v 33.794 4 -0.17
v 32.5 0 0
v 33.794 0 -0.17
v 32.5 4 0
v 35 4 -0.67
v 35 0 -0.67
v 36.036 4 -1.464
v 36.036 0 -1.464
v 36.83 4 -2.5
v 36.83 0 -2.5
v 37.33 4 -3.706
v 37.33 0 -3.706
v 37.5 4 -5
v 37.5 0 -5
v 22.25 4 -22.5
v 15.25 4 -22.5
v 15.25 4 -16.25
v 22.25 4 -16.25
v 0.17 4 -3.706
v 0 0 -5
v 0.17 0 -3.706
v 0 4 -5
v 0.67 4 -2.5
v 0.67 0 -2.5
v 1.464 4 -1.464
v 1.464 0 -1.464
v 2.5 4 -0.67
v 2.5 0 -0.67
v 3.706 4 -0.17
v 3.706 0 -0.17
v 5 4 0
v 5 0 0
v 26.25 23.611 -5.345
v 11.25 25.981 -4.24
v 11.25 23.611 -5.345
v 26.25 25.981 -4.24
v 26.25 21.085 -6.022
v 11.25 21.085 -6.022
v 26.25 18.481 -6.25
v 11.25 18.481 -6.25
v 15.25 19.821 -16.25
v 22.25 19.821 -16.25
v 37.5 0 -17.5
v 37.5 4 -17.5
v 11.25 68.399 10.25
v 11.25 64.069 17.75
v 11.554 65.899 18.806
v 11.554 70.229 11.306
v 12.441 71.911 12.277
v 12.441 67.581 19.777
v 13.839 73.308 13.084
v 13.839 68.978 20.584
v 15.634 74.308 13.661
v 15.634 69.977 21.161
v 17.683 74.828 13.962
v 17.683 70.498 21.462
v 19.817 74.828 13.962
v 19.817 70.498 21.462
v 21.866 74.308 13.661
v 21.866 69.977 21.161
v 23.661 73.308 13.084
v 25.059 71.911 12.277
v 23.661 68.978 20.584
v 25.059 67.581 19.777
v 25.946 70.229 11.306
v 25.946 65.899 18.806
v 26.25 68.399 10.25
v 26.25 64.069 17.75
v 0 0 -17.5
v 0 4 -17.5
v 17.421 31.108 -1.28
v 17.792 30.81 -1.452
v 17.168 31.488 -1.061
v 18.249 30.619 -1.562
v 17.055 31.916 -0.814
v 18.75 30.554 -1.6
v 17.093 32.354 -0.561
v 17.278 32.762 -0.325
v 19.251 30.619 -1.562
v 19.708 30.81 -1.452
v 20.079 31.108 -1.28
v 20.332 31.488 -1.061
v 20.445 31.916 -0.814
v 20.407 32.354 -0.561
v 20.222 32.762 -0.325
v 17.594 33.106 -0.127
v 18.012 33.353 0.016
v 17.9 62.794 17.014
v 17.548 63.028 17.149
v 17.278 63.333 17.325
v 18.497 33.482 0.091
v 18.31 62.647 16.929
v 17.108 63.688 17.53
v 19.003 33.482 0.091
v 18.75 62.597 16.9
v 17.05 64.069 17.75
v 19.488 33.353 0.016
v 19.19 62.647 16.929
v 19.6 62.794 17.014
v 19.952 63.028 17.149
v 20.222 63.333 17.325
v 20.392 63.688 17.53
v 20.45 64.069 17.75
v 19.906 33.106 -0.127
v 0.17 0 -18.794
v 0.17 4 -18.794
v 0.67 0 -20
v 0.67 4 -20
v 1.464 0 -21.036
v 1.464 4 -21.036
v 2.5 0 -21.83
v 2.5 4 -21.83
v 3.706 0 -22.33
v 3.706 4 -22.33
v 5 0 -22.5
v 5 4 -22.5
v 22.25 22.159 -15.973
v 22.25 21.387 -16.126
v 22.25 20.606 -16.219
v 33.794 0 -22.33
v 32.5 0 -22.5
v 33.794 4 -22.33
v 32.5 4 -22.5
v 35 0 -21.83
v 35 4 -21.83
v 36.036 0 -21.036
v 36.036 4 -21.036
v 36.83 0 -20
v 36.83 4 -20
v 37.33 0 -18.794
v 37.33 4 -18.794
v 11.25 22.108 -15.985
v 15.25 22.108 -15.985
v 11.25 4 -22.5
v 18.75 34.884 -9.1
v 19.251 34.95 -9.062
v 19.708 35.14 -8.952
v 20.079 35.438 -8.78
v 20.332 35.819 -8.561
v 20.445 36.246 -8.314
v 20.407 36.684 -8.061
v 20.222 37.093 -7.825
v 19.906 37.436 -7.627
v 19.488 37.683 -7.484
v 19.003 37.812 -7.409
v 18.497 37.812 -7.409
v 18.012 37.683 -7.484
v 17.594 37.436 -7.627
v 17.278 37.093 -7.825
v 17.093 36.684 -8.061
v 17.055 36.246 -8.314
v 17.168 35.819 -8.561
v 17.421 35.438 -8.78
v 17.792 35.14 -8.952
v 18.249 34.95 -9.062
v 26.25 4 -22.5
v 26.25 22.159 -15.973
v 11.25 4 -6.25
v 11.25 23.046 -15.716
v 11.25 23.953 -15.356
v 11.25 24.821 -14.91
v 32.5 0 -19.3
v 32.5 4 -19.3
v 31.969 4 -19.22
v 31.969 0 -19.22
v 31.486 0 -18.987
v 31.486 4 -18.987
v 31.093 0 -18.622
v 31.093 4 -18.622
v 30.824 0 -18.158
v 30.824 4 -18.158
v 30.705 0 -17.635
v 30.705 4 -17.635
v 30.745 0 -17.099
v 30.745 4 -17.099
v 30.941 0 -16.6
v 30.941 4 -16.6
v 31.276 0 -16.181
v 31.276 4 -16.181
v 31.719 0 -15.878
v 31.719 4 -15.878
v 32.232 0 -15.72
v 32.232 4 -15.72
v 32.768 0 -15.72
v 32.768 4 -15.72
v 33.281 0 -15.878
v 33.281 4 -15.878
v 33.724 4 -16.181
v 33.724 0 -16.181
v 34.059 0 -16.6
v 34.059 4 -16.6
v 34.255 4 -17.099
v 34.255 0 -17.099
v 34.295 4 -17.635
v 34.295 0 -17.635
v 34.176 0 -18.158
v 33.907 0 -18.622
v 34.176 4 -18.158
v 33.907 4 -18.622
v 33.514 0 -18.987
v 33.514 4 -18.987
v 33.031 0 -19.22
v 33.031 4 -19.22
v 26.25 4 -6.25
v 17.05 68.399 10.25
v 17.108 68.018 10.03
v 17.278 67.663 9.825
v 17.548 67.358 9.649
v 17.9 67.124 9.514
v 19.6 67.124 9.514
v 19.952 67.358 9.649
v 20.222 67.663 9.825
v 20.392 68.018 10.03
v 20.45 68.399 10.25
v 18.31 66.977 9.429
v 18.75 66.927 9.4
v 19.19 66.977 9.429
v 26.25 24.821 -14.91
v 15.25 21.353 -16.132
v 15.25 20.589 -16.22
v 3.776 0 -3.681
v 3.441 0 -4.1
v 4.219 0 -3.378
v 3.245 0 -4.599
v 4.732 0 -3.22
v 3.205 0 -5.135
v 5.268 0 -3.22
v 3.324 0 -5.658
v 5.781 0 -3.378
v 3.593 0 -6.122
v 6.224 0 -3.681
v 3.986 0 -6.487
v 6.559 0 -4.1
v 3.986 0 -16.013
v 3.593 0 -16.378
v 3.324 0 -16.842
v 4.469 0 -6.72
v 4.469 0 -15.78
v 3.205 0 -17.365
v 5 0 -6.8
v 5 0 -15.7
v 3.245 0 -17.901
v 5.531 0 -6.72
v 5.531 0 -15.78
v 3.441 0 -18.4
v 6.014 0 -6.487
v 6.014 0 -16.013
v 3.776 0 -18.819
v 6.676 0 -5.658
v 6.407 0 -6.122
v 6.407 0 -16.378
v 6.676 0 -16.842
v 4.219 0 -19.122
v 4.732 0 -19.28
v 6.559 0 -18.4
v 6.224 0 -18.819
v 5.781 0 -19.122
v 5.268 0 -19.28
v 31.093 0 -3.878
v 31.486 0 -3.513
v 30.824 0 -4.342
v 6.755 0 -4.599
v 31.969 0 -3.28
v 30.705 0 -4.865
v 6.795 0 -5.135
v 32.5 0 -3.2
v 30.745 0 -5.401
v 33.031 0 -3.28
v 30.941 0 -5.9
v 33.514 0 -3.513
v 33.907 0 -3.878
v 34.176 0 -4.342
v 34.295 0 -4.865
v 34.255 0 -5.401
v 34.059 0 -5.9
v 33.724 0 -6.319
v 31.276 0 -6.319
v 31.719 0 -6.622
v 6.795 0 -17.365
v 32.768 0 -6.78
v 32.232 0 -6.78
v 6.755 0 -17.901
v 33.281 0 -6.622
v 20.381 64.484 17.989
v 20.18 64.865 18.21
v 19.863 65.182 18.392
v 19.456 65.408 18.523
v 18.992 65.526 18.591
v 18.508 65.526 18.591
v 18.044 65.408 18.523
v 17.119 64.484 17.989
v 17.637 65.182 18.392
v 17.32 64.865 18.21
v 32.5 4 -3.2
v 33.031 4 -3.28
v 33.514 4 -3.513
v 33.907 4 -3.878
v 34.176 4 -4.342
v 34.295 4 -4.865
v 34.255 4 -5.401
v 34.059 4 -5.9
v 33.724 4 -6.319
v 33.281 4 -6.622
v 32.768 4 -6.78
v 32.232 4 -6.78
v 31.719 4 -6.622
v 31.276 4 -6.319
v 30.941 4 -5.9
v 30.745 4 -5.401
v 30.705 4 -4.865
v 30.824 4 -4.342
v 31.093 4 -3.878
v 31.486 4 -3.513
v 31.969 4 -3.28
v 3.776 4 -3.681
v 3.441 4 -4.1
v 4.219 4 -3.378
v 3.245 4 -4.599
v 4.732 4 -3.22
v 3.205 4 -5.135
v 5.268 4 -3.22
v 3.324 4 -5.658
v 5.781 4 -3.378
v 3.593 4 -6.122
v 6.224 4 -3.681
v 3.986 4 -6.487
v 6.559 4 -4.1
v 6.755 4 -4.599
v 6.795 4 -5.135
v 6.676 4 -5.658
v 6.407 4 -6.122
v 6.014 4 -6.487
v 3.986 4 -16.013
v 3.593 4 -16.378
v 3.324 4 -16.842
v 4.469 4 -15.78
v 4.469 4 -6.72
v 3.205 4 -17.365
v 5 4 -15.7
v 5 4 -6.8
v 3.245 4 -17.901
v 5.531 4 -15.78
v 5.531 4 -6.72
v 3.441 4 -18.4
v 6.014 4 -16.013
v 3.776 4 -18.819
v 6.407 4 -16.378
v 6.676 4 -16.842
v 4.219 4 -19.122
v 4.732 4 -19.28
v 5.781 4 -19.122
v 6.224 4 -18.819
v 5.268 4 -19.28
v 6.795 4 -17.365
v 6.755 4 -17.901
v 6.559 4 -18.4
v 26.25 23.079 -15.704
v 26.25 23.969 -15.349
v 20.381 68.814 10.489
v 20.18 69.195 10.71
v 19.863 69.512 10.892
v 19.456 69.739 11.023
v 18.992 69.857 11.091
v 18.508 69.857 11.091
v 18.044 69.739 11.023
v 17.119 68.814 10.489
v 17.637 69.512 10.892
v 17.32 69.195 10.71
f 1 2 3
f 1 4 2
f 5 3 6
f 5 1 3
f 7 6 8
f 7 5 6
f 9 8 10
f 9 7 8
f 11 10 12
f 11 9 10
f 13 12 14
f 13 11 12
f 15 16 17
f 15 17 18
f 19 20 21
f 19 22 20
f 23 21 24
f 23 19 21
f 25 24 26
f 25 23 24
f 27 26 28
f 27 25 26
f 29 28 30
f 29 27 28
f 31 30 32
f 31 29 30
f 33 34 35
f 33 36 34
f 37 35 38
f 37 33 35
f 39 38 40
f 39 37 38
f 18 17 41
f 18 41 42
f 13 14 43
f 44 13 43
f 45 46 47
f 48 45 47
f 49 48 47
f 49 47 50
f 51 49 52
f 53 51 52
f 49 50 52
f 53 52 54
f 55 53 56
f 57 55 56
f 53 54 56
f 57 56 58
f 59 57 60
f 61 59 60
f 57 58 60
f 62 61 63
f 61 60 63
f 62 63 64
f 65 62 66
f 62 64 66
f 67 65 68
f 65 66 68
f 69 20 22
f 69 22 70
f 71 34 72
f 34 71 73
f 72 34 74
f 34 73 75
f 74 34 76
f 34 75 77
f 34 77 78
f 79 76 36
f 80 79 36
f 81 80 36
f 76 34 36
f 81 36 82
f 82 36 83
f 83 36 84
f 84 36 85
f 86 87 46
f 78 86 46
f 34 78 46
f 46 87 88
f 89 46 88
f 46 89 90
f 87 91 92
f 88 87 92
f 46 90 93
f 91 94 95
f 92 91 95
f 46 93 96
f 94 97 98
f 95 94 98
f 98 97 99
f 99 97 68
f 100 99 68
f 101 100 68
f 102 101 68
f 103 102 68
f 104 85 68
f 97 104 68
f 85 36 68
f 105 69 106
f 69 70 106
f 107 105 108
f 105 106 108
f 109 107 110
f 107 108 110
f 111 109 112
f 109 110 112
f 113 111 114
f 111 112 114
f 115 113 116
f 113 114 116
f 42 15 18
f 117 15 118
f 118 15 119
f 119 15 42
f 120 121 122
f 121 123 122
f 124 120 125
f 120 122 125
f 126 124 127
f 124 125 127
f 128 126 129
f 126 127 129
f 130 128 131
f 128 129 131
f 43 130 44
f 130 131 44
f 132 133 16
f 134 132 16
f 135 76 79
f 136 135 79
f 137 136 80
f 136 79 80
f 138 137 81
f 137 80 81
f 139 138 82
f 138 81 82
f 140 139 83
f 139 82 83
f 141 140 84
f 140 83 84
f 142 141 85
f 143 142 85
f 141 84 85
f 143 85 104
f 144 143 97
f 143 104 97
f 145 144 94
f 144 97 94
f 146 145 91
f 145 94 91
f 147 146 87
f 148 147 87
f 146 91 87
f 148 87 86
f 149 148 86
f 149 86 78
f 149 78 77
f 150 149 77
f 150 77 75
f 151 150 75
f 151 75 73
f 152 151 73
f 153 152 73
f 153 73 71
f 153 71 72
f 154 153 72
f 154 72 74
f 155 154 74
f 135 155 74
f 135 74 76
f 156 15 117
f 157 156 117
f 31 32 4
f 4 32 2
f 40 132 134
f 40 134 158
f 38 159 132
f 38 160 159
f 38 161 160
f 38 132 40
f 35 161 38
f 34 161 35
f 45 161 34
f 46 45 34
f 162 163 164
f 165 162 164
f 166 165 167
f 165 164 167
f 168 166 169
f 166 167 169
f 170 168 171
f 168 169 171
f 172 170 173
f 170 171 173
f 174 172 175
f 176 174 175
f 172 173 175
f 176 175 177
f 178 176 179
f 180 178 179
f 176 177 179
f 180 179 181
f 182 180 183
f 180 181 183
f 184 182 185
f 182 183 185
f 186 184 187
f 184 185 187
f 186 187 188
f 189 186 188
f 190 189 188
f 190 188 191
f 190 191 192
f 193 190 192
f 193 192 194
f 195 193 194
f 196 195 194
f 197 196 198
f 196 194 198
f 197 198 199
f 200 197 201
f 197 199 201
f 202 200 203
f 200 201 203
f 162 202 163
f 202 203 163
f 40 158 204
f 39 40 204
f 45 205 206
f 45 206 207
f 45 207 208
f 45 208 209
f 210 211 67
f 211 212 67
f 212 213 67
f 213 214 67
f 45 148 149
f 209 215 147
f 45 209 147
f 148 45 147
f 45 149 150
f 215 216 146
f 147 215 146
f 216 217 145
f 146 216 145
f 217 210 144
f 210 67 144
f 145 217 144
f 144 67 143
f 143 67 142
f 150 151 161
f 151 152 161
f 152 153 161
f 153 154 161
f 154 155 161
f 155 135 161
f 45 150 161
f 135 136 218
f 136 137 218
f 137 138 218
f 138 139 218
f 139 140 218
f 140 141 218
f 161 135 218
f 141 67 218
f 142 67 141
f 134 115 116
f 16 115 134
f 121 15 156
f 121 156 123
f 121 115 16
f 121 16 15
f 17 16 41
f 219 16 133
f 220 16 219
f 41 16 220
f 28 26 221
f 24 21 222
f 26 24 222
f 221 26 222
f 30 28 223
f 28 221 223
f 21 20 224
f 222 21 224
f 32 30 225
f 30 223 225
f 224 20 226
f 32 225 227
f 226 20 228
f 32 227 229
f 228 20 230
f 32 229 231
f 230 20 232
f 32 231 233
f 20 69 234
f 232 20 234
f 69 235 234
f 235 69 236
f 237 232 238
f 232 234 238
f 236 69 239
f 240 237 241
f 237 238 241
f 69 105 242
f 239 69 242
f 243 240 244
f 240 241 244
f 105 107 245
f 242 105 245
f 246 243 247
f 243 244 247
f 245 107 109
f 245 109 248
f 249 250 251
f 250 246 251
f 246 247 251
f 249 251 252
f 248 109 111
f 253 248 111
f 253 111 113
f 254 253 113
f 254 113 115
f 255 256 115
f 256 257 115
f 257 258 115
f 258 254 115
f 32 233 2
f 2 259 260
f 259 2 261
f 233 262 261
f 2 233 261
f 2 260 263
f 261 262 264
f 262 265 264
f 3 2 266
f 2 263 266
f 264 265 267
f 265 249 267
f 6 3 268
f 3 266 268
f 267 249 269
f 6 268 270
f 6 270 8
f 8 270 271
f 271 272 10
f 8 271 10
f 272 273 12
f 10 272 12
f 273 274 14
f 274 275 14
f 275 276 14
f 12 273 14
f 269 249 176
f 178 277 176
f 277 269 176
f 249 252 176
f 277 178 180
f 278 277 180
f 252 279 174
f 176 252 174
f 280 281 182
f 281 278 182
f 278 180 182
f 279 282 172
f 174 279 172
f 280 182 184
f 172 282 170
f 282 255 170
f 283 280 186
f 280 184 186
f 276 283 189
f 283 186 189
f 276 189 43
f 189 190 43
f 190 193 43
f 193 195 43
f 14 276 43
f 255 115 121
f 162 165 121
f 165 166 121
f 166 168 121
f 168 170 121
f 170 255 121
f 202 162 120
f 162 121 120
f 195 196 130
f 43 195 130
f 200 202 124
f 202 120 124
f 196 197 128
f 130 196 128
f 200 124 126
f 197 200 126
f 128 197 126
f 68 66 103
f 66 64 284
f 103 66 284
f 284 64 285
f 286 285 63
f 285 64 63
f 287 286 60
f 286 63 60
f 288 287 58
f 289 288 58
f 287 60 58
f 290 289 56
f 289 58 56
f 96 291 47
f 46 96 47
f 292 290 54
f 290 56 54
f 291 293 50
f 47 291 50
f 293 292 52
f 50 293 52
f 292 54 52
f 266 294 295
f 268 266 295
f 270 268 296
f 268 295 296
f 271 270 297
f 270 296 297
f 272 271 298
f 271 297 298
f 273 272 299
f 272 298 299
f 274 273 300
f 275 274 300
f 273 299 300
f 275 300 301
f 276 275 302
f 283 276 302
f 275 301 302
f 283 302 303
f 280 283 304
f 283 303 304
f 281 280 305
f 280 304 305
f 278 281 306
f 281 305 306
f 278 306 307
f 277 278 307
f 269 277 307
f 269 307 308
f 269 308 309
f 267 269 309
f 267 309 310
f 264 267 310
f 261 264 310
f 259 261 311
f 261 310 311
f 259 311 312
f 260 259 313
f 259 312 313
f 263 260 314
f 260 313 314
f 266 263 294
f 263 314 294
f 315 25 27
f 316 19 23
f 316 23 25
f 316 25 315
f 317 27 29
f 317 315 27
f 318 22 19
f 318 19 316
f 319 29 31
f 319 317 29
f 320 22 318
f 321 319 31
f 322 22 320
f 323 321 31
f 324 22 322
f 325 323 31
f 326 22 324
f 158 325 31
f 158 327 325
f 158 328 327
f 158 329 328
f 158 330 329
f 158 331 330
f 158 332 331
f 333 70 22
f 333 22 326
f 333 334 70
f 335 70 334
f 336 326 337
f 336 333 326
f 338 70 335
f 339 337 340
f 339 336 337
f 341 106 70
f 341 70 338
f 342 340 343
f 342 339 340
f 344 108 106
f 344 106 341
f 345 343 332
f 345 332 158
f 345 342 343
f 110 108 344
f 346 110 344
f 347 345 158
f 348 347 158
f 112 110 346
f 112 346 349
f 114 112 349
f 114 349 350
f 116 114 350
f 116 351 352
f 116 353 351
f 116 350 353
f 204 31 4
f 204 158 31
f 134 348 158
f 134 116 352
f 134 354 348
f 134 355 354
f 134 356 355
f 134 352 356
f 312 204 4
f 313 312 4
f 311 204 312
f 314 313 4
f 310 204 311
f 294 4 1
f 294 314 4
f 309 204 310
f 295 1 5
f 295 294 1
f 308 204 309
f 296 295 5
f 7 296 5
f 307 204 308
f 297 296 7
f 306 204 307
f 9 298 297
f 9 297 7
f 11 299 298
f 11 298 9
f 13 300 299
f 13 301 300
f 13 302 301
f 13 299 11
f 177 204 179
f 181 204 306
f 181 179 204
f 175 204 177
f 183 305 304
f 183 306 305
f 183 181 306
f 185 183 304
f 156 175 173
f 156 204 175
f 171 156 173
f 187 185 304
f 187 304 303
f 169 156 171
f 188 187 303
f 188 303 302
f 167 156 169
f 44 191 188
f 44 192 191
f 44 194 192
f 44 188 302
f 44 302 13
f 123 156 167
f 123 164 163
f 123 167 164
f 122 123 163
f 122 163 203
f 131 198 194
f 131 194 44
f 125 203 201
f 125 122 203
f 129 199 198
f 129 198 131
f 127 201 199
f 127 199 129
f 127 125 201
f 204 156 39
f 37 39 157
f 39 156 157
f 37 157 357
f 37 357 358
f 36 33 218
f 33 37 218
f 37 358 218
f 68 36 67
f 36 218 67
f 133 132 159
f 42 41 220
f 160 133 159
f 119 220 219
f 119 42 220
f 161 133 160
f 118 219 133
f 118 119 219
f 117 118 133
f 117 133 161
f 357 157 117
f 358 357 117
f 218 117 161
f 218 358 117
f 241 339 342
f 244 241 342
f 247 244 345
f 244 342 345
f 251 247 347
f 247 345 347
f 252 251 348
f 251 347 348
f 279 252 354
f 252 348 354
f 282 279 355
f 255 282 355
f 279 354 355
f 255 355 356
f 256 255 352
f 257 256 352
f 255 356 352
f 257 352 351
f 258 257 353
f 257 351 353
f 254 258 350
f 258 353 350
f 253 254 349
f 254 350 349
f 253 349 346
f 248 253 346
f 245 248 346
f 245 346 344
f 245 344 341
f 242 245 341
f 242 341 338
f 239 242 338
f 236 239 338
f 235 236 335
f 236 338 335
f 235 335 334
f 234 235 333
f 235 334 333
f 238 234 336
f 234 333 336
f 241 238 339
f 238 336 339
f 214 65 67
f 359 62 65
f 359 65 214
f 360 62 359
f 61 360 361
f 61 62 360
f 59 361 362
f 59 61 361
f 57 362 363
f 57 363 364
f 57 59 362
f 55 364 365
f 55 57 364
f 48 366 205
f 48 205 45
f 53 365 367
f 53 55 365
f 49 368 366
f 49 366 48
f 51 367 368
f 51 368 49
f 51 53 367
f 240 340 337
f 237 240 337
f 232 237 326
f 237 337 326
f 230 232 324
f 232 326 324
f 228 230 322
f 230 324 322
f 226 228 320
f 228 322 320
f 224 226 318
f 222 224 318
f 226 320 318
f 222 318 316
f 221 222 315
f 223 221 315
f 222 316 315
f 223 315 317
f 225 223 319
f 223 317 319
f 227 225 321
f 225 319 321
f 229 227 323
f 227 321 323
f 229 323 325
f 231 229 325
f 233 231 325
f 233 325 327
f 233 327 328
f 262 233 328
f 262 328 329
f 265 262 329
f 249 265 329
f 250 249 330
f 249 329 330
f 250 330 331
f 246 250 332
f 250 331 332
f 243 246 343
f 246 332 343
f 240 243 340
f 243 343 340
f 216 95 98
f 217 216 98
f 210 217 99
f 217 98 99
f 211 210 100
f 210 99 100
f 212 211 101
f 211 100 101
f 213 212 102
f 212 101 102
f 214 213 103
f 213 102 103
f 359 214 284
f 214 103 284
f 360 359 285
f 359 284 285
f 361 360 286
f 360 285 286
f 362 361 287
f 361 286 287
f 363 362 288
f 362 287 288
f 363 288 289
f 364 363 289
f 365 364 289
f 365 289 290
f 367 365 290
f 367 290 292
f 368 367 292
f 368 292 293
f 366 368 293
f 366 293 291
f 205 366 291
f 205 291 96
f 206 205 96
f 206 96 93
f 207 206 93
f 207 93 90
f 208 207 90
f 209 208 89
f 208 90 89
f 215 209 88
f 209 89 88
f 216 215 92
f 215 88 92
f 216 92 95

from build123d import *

# Parameters (mm, degrees)
SKETCH_1_W          = 37.5
SKETCH_1_H          = 22.5
EXTRUDE_2_DEPTH     = 4
SKETCH_2_W          = 15
SKETCH_2_H          = 10
EXTRUDE_3_DEPTH     = 18.5
EXTRUDE_4_DEPTH     = 15
EXTRUDE_5_DEPTH     = 8.66025404
SKETCH_5_R          = 1.7
CUT_EXTRUDE_1_DEPTH = 10
FILLET_1_R          = 15
FILLET_3_R          = 5
SKETCH_9_R          = 1.8
CUT_EXTRUDE_2_DEPTH = 4
FILLET_5_R          = 10
RIB_10_REACH        = 84.489
SKETCH_16_WALL_W    = 186.275176358
SKETCH_16_WALL_H    = 4
RIB_11_REACH        = 84.489
SKETCH_17_WALL_W    = 186.223541182
SKETCH_17_WALL_H    = 4


with BuildPart() as part:
    # 草图1 → 凸台-拉伸2 (new body)
    with BuildSketch(Plane(origin=(0, 0, 0), x_dir=(1, 0, 0), z_dir=(0, 1, 0))):
        with Locations((18.75, 11.25)):
            Rectangle(SKETCH_1_W, SKETCH_1_H)
    extrude(amount=EXTRUDE_2_DEPTH)

    # 草图2 → 凸台-拉伸3 (add)
    with BuildSketch(Plane(origin=(0, 4, 0), x_dir=(1, 0, 0), z_dir=(0, 1, 0))):
        with Locations((18.75, 11.25)):
            Rectangle(SKETCH_2_W, SKETCH_2_H)
    extrude(amount=EXTRUDE_3_DEPTH)

    # 草图3 → 凸台-拉伸4 (add)
    with BuildSketch(Plane(origin=(26.25, 0, 0), x_dir=(0, 0, -1), z_dir=(1, 0, 0))):
        Polygon((6.25, 22.5), (-17.75, 64.069219382), (-10.25, 68.399346401), (16.25, 22.5), align=None)
    extrude(amount=-EXTRUDE_4_DEPTH)

    # 草图4 → 凸台-拉伸5 (add)
    with BuildSketch(Plane(origin=(0, 8.331329387, -14.430285793), x_dir=(1, 0, 0), z_dir=(0, -0.5000000000000041, 0.8660254037844363))):
        with BuildLine():
            Line((26.25, 64.360571585), (11.25, 64.360571585))
            ThreePointArc((11.25, 64.360571585), (18.75, 71.860571585), (26.25, 64.360571585))
        make_face()
    extrude(amount=-EXTRUDE_5_DEPTH)

    # 草图5 → 切除-拉伸1 (cut)
    with BuildSketch(Plane(origin=(0, 8.331329387, -14.430285793), x_dir=(1, 0, 0), z_dir=(0, -0.5000000000000041, 0.8660254037844363))):
        with Locations((18.75, 64.360571585)):
            Circle(SKETCH_5_R)
        with Locations((18.75, 27.360571585)):
            Circle(SKETCH_5_R)
    extrude(amount=-CUT_EXTRUDE_1_DEPTH, mode=Mode.SUBTRACT)

    # 圆角1
    fillet_1_edges = [part.edges().sort_by_distance(p)[0] for p in [
        (18.75, 22.5, -6.25),
    ]]
    fillet(fillet_1_edges, radius=FILLET_1_R)

    # 圆角3
    fillet_3_edges = [part.edges().sort_by_distance(p)[0] for p in [
        (37.5, 2, 0),
        (37.5, 2, -22.5),
        (0, 2, 0),
        (0, 2, -22.5),
    ]]
    fillet(fillet_3_edges, radius=FILLET_3_R)

    # 草图9 → 切除-拉伸2 (cut)
    with BuildSketch(Plane(origin=(0, 4, 0), x_dir=(1, 0, 0), z_dir=(0, 1, 0))):
        with Locations((5, 17.5)):
            Circle(SKETCH_9_R)
        with Locations((32.5, 17.5)):
            Circle(SKETCH_9_R)
        with Locations((32.5, 5)):
            Circle(SKETCH_9_R)
        with Locations((5, 5)):
            Circle(SKETCH_9_R)
    extrude(amount=-CUT_EXTRUDE_2_DEPTH, mode=Mode.SUBTRACT)

    # 圆角5
    fillet_5_edges = [part.edges().sort_by_distance(p)[0] for p in [
        (18.75, 22.5, -16.25),
    ]]
    fillet(fillet_5_edges, radius=FILLET_5_R)

    # 草图16 wall → 筋10 (add, up to next)
    with BuildSketch(Plane(origin=(26.25, 13.079426042, -19.236382193), x_dir=(0, 0.941051653324, 0.33826289447), z_dir=(0, -0.33826289447, 0.941051653324)), mode=Mode.PRIVATE) as rib_10_sk1:
        with Locations((0, 2)):
            Rectangle(SKETCH_16_WALL_W, SKETCH_16_WALL_H)
    rib_10_tool1 = extrude(rib_10_sk1.sketch, amount=RIB_10_REACH, mode=Mode.PRIVATE) - part.part
    add(rib_10_tool1.solids().sort_by_distance((26.25, 13.079426042, -19.236382193))[0])

    # 草图17 wall → 筋11 (add, up to next)
    with BuildSketch(Plane(origin=(11.25, 13.054150816, -19.242391515), x_dir=(0, 0.940949854763, 0.338545965597), z_dir=(0, 0.338545965597, -0.940949854763)), mode=Mode.PRIVATE) as rib_11_sk1:
        with Locations((0, 2)):
            Rectangle(SKETCH_17_WALL_W, SKETCH_17_WALL_H)
    rib_11_tool1 = extrude(rib_11_sk1.sketch, amount=-RIB_11_REACH, mode=Mode.PRIVATE) - part.part
    add(rib_11_tool1.solids().sort_by_distance((11.25, 13.054150816, -19.242391515))[0])


solid = part.part
